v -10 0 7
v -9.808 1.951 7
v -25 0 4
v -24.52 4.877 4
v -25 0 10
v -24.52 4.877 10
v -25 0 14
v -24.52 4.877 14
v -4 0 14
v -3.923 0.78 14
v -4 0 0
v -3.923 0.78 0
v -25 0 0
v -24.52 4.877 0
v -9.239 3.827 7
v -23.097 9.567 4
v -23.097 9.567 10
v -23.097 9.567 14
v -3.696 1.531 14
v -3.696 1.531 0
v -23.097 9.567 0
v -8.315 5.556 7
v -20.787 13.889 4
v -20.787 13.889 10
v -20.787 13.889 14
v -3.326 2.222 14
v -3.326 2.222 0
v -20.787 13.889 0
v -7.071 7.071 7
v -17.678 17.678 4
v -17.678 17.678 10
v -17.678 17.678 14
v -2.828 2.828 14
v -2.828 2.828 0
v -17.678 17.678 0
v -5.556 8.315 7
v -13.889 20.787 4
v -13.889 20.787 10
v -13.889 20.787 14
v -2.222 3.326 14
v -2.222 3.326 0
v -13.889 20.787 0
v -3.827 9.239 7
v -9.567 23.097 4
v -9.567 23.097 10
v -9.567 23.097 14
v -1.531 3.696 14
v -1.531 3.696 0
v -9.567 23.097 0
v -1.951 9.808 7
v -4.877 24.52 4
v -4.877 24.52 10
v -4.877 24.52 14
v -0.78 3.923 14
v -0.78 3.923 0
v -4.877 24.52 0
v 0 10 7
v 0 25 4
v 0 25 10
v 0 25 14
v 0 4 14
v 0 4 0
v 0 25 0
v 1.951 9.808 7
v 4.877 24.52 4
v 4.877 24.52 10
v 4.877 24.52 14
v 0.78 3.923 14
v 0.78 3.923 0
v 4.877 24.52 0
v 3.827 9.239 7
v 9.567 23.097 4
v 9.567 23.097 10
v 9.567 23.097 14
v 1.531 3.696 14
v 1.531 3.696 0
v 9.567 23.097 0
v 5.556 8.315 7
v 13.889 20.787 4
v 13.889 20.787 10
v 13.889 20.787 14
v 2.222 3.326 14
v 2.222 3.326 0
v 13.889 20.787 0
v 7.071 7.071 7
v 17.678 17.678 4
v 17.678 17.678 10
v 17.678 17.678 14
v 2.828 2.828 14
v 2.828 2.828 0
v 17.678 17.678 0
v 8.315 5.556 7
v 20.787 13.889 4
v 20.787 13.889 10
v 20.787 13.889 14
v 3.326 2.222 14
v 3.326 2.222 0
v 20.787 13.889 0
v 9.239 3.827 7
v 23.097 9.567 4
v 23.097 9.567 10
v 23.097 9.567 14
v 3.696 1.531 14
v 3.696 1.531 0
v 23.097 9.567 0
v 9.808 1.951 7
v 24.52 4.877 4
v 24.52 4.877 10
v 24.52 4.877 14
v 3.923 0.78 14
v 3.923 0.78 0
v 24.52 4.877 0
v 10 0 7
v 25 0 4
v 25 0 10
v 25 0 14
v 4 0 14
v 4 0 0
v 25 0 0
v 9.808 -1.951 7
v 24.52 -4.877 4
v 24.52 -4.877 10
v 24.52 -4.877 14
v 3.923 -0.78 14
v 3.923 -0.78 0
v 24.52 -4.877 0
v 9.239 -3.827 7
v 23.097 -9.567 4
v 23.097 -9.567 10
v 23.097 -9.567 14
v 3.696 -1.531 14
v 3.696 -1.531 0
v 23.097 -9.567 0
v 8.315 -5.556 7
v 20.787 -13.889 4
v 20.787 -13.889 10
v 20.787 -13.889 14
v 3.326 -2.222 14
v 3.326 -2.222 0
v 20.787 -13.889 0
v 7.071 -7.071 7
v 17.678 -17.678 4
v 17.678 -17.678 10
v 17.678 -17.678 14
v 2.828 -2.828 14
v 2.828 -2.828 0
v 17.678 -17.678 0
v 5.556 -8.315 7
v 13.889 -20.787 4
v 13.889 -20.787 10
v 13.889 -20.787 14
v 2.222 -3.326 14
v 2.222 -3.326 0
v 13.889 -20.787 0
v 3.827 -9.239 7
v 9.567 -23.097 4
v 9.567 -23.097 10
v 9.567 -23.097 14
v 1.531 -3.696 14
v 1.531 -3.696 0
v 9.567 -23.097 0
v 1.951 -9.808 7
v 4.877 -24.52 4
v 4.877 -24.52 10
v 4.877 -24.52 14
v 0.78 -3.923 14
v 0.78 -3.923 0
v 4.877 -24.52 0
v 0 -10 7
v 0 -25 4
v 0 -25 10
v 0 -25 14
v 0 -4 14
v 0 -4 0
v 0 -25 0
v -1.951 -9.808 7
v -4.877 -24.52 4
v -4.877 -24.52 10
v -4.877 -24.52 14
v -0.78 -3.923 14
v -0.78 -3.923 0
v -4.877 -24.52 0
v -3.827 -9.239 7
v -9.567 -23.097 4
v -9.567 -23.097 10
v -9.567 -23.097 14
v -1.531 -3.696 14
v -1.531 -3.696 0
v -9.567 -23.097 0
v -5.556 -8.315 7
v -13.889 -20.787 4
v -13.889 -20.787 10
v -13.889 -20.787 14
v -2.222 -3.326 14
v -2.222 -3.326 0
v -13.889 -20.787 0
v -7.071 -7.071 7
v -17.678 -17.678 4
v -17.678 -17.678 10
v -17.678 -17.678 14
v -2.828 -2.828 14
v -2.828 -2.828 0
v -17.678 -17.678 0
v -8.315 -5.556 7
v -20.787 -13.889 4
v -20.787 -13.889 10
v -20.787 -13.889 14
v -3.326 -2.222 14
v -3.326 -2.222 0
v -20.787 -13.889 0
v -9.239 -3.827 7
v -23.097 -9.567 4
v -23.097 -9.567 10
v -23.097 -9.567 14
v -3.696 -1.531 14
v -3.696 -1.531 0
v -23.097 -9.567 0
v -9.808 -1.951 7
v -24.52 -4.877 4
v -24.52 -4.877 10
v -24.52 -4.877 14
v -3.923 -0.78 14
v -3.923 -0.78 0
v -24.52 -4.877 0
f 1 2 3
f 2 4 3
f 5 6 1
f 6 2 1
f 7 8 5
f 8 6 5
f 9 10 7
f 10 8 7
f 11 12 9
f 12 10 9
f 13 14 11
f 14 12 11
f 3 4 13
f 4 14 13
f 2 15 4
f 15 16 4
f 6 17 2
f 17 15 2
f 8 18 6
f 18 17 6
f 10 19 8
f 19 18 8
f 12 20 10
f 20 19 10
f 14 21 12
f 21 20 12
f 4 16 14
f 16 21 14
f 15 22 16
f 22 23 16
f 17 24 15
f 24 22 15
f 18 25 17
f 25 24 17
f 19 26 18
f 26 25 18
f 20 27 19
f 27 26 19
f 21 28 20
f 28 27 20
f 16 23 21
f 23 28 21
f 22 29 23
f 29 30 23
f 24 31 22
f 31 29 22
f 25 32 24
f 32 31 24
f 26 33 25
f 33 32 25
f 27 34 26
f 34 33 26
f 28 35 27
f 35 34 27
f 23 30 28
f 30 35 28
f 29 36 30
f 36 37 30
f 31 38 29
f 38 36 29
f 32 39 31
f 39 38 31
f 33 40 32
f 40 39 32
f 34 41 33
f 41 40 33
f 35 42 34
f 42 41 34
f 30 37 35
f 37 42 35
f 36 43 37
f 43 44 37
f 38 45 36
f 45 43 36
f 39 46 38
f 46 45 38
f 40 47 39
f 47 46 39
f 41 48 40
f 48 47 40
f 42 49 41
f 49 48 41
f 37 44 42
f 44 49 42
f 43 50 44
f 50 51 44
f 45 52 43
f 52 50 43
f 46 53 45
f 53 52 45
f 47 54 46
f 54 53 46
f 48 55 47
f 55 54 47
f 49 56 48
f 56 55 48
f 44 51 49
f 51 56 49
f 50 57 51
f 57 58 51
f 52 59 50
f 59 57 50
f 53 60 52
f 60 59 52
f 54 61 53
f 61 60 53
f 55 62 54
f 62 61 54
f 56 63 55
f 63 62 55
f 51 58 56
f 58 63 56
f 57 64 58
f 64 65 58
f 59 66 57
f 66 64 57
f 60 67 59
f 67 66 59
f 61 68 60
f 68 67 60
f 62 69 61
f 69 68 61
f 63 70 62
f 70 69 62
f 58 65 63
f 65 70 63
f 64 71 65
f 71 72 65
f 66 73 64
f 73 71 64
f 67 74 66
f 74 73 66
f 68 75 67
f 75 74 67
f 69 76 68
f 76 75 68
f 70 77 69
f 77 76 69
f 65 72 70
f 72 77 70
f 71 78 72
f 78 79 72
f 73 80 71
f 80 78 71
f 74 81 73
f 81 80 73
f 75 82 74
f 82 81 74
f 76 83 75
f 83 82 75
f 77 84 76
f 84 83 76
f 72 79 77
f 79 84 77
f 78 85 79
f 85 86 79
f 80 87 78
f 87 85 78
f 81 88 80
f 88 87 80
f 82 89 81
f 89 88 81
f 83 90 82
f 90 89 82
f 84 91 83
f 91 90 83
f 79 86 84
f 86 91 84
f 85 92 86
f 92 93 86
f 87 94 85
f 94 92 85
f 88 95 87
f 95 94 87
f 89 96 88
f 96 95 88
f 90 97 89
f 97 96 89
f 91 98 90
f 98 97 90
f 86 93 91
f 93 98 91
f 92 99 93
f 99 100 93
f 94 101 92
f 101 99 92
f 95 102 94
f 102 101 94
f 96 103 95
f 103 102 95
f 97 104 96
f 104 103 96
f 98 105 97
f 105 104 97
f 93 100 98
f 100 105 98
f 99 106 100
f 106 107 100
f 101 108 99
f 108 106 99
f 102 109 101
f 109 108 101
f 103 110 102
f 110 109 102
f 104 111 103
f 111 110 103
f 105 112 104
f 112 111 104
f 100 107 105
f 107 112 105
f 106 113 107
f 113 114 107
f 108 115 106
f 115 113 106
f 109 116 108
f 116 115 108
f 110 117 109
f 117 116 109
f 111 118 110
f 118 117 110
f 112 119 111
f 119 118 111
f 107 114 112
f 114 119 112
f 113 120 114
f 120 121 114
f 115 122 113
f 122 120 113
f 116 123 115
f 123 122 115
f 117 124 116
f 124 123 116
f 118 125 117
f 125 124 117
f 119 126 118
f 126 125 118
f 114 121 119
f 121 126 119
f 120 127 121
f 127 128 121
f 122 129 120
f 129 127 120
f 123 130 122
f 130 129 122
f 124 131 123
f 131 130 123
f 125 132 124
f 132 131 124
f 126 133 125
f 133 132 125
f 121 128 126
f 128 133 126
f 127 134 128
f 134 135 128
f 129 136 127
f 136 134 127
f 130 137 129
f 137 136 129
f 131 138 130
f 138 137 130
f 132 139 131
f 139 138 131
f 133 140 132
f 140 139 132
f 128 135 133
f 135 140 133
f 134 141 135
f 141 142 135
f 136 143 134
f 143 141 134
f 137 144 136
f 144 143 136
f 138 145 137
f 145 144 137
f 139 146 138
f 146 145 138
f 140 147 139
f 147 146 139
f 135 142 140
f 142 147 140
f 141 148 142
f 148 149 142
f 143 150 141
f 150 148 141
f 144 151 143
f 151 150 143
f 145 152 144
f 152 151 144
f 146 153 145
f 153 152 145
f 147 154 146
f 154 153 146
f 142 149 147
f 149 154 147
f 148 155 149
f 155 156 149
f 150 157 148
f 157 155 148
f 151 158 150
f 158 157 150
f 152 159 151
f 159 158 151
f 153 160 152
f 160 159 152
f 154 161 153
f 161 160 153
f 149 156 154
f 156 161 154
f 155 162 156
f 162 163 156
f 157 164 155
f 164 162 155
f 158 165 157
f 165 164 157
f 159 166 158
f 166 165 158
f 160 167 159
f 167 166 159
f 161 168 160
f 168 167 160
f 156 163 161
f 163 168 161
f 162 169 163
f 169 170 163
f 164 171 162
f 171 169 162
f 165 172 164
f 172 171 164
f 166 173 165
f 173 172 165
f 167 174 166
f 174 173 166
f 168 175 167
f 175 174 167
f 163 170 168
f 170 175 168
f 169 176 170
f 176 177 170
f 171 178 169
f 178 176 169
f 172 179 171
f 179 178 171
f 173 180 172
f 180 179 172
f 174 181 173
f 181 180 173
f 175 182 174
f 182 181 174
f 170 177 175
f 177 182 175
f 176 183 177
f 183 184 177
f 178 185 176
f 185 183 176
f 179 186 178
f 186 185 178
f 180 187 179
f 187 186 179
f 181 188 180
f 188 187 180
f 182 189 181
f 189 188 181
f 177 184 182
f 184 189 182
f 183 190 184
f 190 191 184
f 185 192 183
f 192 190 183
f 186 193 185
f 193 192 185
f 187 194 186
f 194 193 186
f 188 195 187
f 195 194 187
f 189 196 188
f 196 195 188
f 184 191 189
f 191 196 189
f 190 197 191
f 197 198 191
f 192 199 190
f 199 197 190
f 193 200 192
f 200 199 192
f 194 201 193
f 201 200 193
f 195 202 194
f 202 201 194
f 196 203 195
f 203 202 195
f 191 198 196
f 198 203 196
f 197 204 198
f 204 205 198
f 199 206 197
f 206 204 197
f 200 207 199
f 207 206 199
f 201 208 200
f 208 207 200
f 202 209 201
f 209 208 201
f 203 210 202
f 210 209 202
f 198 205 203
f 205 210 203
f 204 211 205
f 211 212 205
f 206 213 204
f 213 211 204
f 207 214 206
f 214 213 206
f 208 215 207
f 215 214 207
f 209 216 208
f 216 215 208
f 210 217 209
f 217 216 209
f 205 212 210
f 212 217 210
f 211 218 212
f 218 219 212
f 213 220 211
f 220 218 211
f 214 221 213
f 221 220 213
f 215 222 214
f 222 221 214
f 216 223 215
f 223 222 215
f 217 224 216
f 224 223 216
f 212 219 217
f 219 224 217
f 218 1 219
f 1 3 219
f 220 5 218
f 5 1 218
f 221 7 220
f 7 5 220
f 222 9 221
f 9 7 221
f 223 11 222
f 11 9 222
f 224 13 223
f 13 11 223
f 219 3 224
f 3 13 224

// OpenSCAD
$fn = 32;

// ----------------------------------------------------------------------
// Revolved part: V-groove pulley R25
// ----------------------------------------------------------------------

// --- parameters (mm) ---
bore_r = 4;               // bore radius
rim_r = 25;               // rim radius
rim_t = 14;               // rim width
groove_r = 10;            // groove root radius
groove_w = 3;             // groove half width
revolve_angle = 360;      // revolve sweep, degrees

bore_d = 2 * bore_r;
rim_d = 2 * rim_r;
groove_d = 2 * groove_r;

profile = [[4, 0], [25, 0], [25, 4], [10, 7], [25, 10], [25, 14], [4, 14]];  // primary outline, 7 points, counter clockwise

// --- the one profile operation ---
rotate_extrude(angle = revolve_angle) polygon(points = profile);
